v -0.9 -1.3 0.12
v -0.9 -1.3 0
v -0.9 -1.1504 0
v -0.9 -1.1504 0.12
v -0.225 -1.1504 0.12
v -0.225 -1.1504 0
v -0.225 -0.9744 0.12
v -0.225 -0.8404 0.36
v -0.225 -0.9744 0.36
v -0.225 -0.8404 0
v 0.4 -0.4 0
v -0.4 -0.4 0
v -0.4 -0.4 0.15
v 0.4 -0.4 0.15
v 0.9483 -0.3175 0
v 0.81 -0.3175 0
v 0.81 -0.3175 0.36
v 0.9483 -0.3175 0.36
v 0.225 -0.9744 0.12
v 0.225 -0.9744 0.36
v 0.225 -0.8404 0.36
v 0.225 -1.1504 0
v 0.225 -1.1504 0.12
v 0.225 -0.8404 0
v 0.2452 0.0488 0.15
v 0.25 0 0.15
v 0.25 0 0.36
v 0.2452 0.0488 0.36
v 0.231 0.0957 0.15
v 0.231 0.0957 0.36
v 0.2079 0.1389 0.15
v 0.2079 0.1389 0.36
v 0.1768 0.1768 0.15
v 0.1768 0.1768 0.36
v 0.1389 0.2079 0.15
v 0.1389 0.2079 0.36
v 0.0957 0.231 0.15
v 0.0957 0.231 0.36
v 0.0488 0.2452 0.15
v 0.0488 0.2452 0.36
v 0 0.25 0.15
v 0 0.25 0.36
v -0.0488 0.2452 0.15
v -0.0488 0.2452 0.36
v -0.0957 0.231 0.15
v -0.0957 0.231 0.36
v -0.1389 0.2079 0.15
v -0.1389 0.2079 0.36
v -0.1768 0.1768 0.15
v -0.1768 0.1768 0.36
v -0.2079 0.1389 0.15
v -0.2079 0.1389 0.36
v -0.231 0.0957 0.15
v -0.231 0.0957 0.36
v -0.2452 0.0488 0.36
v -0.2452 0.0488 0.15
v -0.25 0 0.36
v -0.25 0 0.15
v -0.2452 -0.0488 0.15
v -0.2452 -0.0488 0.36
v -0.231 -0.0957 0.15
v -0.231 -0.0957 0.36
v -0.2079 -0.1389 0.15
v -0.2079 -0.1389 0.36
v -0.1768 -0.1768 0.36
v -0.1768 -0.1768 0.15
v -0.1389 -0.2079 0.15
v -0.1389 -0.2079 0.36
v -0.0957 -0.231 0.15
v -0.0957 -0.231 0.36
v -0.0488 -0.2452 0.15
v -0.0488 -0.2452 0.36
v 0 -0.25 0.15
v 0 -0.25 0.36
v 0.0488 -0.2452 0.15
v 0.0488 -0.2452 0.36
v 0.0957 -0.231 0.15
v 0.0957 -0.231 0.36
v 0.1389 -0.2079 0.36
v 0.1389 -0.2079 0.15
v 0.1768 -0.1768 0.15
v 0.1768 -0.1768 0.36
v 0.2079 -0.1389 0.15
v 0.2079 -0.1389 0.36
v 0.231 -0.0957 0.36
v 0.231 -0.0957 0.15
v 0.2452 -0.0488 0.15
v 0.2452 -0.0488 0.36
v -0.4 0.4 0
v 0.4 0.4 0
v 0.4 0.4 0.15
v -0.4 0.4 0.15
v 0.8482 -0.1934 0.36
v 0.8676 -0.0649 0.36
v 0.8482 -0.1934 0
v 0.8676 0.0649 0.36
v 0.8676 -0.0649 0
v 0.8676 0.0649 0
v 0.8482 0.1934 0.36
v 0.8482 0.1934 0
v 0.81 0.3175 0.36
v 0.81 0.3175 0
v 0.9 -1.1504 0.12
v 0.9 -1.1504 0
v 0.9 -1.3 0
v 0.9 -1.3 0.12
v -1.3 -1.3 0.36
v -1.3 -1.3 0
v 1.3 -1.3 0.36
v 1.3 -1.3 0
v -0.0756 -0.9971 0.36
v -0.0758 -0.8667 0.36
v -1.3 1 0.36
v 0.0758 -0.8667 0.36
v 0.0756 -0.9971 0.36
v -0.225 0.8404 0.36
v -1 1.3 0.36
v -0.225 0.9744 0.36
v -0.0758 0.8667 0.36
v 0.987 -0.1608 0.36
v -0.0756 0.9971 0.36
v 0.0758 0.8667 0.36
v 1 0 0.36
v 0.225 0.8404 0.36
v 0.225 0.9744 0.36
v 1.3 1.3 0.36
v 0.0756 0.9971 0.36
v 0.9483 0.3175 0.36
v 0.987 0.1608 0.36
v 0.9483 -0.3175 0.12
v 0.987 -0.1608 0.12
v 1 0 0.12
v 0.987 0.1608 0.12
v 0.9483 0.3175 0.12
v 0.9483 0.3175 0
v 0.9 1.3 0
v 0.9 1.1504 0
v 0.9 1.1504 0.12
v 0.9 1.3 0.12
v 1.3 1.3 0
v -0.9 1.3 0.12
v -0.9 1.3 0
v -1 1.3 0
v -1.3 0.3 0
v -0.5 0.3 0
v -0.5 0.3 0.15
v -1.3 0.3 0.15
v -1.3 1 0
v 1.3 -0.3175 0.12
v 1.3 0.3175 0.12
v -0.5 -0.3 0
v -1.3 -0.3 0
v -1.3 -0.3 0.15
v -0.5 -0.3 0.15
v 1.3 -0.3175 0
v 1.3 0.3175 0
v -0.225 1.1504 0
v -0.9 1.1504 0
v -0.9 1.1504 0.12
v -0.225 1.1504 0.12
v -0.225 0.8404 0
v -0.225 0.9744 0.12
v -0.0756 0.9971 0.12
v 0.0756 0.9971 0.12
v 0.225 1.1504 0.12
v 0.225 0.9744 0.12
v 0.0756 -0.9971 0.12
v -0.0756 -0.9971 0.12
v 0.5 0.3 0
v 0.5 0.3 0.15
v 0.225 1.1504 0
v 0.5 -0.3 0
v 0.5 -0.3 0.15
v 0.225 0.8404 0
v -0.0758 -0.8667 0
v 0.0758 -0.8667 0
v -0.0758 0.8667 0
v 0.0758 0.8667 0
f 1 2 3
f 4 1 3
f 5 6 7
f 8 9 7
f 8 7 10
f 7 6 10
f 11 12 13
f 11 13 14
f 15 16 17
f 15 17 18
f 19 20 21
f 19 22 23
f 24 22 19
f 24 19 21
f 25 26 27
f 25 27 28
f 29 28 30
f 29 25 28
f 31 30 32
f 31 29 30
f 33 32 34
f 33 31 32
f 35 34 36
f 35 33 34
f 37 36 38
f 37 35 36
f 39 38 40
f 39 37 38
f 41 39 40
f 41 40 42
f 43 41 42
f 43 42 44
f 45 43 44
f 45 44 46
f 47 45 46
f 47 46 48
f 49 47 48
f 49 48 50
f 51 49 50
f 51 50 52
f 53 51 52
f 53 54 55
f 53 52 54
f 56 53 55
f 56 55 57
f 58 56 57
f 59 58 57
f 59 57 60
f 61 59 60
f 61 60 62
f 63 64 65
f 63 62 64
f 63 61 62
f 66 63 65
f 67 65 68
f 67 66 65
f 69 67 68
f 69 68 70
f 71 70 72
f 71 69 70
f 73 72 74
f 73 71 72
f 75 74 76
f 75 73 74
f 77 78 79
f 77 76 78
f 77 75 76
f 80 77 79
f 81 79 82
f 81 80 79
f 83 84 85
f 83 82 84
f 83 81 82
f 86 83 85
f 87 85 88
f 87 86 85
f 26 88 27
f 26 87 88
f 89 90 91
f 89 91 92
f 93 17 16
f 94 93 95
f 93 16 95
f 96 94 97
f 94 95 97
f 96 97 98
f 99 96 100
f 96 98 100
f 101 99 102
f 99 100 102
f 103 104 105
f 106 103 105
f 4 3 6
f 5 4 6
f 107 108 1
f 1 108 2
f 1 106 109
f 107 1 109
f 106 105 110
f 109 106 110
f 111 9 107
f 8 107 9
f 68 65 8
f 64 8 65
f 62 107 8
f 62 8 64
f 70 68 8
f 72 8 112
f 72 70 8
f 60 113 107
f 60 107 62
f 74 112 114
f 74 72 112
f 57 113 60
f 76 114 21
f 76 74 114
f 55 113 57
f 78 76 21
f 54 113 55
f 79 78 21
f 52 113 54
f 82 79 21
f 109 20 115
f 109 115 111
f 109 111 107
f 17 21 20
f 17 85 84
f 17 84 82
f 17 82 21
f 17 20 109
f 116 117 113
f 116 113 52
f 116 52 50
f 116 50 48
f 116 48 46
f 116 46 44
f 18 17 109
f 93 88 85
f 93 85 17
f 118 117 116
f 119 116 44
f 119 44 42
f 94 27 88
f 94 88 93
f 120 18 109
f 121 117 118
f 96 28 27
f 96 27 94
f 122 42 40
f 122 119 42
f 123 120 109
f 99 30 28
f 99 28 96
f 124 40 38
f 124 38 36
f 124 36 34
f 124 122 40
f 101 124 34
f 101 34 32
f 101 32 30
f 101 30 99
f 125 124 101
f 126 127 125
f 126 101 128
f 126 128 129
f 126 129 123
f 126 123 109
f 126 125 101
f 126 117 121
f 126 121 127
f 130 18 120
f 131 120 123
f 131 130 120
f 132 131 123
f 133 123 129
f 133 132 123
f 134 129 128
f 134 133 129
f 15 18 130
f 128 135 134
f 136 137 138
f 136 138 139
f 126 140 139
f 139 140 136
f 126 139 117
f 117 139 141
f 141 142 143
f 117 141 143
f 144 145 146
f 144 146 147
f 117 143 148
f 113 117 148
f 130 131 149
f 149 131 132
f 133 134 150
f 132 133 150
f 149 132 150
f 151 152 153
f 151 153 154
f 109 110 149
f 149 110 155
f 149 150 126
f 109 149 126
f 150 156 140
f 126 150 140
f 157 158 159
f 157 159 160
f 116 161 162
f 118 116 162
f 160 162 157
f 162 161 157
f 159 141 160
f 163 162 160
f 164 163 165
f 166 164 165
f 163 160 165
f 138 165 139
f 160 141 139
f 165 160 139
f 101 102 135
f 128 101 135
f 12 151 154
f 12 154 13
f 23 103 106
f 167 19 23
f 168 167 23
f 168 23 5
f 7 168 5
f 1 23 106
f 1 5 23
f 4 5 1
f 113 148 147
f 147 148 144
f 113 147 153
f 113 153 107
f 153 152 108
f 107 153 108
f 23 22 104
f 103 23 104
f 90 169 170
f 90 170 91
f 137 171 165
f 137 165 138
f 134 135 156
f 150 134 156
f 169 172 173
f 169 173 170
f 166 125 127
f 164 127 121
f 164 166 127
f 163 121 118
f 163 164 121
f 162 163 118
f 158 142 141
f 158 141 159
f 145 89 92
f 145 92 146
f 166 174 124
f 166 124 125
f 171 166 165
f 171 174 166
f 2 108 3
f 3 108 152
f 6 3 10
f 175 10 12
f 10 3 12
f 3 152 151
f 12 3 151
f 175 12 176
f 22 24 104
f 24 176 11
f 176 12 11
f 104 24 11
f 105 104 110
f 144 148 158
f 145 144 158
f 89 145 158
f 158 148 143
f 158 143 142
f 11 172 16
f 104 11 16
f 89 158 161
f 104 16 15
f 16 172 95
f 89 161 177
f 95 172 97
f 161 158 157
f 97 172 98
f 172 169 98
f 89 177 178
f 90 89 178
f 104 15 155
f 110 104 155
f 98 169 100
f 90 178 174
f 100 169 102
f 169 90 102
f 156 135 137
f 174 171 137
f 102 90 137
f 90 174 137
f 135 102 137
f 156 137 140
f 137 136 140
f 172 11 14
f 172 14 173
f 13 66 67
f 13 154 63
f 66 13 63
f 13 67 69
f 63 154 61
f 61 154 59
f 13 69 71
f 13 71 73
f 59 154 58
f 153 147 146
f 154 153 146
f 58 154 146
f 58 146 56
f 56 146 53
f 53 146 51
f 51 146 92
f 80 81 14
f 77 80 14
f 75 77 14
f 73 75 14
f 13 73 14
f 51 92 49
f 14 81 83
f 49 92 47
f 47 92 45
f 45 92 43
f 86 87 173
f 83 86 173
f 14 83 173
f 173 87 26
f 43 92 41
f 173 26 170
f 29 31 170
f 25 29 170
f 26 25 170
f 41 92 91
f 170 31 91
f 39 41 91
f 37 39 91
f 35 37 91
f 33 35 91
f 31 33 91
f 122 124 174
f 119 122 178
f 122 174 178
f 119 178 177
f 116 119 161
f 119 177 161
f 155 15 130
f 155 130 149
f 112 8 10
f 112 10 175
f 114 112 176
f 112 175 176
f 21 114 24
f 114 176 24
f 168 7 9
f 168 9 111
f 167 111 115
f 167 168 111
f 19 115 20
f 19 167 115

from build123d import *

# Parameters (mm, degrees)
SKETCH007_R   = 0.25
PAD003_DEPTH  = 1.23
PAD004_DEPTH  = 0.15
FILLET_R      = 0.2
SKETCH001_R   = 1
SKETCH001_R_2 = 0.87
PAD001_DEPTH  = 1.3
SKETCH002_W   = 0.775
SKETCH002_H   = 1.948718
SKETCH002_W_2 = 0.723262
SKETCH002_H_2 = 0.656869
POCKET_DEPTH  = 0.36
SKETCH003_W   = 0.591738
SKETCH003_H   = 0.63498
PAD002_DEPTH  = 0.12
PAD_DEPTH     = 0.36


with BuildPart() as body004:
    # Sketch007 → Pad003 (new body)
    with BuildSketch(Plane.XY):
        Circle(SKETCH007_R)
    extrude(amount=PAD003_DEPTH)

    # Sketch008 → Pad004 (join)
    with BuildSketch(Plane.XY):
        Polygon((-1.54, -0.3), (-0.5, -0.3), (-0.4, -0.4), (0.4, -0.4), (0.5, -0.3), (0.5, 0.3), (0.4, 0.4), (-0.4, 0.4), (-0.5, 0.3), (-1.54, 0.3), align=None)
    extrude(amount=PAD004_DEPTH)

    # Fillet
    fillet_edges = [body004.edges().sort_by_distance(p)[0] for p in [
        (-0.25, 0, 1.23),
    ]]
    fillet(fillet_edges, radius=FILLET_R)


with BuildPart() as body003:
    # Sketch001 → Pad001 (new body)
    with BuildSketch(Plane.XY):
        Circle(SKETCH001_R)
        Circle(SKETCH001_R_2, mode=Mode.SUBTRACT)
    extrude(amount=PAD001_DEPTH)

    # Sketch002 → Pocket (cut)
    with BuildSketch(Plane.XY):
        with Locations((-0.6125, 0)):
            Rectangle(SKETCH002_W, SKETCH002_H)
        with Locations((0.586631, 0.645925)):
            Rectangle(SKETCH002_W_2, SKETCH002_H_2)
        with Locations((0.586631, -0.645925)):
            Rectangle(SKETCH002_W_2, SKETCH002_H_2)
    extrude(amount=POCKET_DEPTH, mode=Mode.SUBTRACT)

    # Sketch003 → Pad002 (join)
    with BuildSketch(Plane.XY):
        Polygon((-0.225, -0.974359), (0.225, -0.974359), (0.225, -1.150402), (0.9, -1.150402), (0.9, -1.5), (-0.9, -1.5), (-0.9, -1.150402), (-0.225, -1.150402), align=None)
        Polygon((-0.225, 0.974359), (0.225, 0.974359), (0.225, 1.150402), (0.9, 1.150402), (0.9, 1.5), (-0.9, 1.5), (-0.9, 1.150402), (-0.225, 1.150402), align=None)
        with Locations((1.244131, 0)):
            Rectangle(SKETCH003_W, SKETCH003_H)
    extrude(amount=PAD002_DEPTH)

    # Sketch005 → Groove (revolve, cut)
    with BuildSketch(Plane.XZ):
        Polygon((1, 0.81), (0.93, 0.74), (0.93, 0.6), (1, 0.53), align=None)
        Polygon((0.93, 1.3), (1, 1.23), (1, 1.3), align=None)
    revolve(axis=Axis((0, 0, 0), (0, 0, 1)), mode=Mode.SUBTRACT)


with BuildPart() as cut001:
    # Sketch → Pad (new body)
    with BuildSketch(Plane.XY):
        Polygon((-1.3, 1), (-1.3, -1.3), (1.3, -1.3), (1.3, 1.3), (-1, 1.3), align=None)
    extrude(amount=PAD_DEPTH)

    # Cut: cut Body003
    add(body003.part, mode=Mode.SUBTRACT)

    # Cut001: cut Body004
    add(body004.part, mode=Mode.SUBTRACT)


solid = cut001.part
